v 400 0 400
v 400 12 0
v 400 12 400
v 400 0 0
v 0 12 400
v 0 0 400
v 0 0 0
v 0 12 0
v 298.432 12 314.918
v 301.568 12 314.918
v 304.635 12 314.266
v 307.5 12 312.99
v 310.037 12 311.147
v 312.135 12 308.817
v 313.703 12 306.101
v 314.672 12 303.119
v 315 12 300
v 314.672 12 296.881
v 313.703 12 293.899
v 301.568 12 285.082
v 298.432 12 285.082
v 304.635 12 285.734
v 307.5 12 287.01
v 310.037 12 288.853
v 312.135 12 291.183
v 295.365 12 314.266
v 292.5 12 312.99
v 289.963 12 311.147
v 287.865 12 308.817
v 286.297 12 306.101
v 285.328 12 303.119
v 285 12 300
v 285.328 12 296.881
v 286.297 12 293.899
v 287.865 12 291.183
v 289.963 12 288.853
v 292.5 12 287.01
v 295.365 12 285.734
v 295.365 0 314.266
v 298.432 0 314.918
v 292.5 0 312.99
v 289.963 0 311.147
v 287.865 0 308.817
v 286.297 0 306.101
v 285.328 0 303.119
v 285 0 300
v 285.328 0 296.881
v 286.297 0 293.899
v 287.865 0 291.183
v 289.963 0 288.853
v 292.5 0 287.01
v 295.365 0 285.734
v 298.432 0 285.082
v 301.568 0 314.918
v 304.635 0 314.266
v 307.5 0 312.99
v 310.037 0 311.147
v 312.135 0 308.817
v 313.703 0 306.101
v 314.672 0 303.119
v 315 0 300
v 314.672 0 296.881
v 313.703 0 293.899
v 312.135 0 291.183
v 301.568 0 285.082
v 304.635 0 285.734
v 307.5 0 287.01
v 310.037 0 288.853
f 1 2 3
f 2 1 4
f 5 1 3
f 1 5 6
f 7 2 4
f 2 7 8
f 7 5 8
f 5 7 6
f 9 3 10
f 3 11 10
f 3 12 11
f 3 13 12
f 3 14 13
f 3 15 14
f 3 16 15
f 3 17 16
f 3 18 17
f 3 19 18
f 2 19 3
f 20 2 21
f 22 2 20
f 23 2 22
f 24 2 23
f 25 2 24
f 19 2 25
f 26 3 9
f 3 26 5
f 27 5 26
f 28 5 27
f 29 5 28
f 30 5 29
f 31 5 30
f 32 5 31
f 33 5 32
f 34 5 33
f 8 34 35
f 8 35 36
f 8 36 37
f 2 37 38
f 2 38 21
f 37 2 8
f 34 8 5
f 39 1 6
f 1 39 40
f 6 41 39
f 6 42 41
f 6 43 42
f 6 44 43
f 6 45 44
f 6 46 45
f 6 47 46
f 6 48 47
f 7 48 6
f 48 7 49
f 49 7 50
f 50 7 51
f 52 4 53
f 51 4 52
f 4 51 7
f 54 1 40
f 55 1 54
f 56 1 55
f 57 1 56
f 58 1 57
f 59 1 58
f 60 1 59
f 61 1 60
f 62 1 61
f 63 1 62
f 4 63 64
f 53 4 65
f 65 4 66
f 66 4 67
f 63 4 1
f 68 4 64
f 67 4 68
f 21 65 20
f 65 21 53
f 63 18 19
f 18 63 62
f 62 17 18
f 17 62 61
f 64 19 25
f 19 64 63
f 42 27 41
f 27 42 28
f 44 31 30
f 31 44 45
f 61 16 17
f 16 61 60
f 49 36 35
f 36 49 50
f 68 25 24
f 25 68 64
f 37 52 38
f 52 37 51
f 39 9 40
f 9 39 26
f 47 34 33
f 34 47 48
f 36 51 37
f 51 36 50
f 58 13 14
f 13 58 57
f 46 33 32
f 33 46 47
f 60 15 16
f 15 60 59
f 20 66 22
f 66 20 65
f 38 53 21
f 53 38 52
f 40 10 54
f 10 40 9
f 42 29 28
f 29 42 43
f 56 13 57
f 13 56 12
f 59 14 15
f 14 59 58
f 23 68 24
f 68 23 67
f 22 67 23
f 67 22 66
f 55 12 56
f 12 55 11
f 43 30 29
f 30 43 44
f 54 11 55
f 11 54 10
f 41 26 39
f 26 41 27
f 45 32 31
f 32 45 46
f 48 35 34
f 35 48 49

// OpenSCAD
/*
    Door
    
    By Anton Augustsson
*/

module door (
    thicknessPlywood,
    height,
    width,
    x,y,z
    ){
/*
    ---------- Local varibles ---------- 
*/

holeDiameter = 30;


/*
    ---------- Code ---------- 
*/
  
translate([
    x,
    y,
    z])
difference () {
union () {

// Front
translate([
    0,
    0,
    0])
cube([
    width,
    thicknessPlywood,
    height]);

}
translate([
    width/4*3,
    -1,
    height/4*3])
rotate([-90,0,0])
cylinder(
    h = thicknessPlywood+2,
    r = holeDiameter/2
    );

}
}


/*
    ---------- Example ---------- 
*/

sideOverhangWidth = 100;
sideOverhangDepth = 50;

thicknessMdf = 19;
thicknessPlywood = 12; 

totalHeight = 900;
totalWidth = 900; // t-profile
totalDepth = 500;

foundationHeight = 
    totalHeight
    -thicknessMdf;
foundationWidth = 
    totalWidth
    -sideOverhangWidth*2;
foundationDepth =
    totalDepth
    -sideOverhangDepth*2;

routerBoxHeight = 400;
routerBoxWidth = 400;        
positionShelfHeight = 
        foundationHeight
        -thicknessPlywood*2
        -routerBoxHeight;

sideHeight = 
        foundationHeight
        -thicknessPlywood*2;


door (
    thicknessPlywood,
    routerBoxHeight,
    routerBoxWidth,
    0,0,0
    );
